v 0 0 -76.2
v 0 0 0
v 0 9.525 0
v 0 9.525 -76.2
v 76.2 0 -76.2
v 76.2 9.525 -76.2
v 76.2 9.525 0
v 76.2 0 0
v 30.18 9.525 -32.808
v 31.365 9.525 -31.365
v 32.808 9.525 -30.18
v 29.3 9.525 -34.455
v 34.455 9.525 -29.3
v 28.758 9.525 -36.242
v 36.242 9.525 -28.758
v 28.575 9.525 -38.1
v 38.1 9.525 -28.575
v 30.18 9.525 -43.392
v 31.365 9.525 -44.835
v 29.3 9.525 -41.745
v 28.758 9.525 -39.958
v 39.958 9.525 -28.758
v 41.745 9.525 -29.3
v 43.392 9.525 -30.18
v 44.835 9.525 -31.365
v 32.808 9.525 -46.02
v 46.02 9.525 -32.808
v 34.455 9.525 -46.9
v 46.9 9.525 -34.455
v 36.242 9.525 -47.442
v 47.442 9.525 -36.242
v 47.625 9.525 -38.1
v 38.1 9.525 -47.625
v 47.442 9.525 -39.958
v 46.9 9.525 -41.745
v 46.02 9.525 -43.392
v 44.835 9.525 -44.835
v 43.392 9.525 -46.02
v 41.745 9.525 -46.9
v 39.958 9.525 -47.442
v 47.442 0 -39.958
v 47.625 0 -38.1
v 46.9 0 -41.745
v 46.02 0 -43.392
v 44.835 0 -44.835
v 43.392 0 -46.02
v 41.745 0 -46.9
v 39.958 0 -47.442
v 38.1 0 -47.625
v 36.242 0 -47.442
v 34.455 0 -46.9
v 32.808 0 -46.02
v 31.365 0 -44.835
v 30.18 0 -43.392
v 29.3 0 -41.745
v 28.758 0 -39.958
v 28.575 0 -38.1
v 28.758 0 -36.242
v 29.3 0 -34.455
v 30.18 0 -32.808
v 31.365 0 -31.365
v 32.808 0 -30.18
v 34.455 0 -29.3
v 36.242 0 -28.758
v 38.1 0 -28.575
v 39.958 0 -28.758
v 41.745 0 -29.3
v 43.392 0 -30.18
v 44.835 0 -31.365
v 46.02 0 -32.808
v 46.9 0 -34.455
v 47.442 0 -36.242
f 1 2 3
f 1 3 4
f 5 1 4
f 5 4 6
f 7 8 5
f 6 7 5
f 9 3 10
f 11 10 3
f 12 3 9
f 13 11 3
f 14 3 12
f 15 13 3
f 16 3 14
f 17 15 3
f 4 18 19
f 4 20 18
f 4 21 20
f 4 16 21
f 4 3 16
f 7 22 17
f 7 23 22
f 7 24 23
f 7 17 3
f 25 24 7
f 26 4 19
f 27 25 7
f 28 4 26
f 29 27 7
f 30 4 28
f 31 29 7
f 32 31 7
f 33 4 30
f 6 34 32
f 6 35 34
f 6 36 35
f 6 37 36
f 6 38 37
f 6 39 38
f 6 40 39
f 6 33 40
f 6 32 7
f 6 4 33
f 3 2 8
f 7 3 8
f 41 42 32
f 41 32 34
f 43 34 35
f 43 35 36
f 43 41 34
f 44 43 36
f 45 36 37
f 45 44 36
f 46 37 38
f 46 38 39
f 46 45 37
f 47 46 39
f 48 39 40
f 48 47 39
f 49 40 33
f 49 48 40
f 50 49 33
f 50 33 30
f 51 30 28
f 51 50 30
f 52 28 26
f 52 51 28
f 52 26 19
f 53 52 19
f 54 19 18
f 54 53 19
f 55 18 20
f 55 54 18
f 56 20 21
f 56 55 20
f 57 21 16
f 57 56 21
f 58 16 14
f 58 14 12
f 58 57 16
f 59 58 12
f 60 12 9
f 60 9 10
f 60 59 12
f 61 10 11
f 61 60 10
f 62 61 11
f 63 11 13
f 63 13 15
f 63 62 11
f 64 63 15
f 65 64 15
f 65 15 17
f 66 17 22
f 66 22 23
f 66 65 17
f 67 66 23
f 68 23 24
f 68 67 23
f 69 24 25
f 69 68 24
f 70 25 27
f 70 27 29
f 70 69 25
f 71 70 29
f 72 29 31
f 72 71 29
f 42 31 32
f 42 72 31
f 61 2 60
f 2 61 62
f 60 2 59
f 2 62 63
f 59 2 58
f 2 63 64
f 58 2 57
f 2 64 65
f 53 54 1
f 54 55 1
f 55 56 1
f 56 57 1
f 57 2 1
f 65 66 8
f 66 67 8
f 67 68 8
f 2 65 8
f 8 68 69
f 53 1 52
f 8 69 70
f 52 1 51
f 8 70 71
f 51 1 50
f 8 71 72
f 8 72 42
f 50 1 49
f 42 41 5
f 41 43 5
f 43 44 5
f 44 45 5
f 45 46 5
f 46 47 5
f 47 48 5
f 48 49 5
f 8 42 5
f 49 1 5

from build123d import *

# Parameters (mm, degrees)
SKETCH1_W           = 76.2
SKETCH1_H           = 76.2
SKETCH1_R           = 9.525
BOSS_EXTRUDE1_DEPTH = 9.525


with BuildPart() as part:
    # Sketch1 → Boss-Extrude1 (new body)
    with BuildSketch(Plane(origin=(0, 0, 0), x_dir=(1, 0, 0), z_dir=(0, 1, 0))):
        with Locations((38.1, 38.1)):
            Rectangle(SKETCH1_W, SKETCH1_H)
        with Locations((38.1, 38.1)):
            Circle(SKETCH1_R, mode=Mode.SUBTRACT)
    extrude(amount=BOSS_EXTRUDE1_DEPTH)


solid = part.part
